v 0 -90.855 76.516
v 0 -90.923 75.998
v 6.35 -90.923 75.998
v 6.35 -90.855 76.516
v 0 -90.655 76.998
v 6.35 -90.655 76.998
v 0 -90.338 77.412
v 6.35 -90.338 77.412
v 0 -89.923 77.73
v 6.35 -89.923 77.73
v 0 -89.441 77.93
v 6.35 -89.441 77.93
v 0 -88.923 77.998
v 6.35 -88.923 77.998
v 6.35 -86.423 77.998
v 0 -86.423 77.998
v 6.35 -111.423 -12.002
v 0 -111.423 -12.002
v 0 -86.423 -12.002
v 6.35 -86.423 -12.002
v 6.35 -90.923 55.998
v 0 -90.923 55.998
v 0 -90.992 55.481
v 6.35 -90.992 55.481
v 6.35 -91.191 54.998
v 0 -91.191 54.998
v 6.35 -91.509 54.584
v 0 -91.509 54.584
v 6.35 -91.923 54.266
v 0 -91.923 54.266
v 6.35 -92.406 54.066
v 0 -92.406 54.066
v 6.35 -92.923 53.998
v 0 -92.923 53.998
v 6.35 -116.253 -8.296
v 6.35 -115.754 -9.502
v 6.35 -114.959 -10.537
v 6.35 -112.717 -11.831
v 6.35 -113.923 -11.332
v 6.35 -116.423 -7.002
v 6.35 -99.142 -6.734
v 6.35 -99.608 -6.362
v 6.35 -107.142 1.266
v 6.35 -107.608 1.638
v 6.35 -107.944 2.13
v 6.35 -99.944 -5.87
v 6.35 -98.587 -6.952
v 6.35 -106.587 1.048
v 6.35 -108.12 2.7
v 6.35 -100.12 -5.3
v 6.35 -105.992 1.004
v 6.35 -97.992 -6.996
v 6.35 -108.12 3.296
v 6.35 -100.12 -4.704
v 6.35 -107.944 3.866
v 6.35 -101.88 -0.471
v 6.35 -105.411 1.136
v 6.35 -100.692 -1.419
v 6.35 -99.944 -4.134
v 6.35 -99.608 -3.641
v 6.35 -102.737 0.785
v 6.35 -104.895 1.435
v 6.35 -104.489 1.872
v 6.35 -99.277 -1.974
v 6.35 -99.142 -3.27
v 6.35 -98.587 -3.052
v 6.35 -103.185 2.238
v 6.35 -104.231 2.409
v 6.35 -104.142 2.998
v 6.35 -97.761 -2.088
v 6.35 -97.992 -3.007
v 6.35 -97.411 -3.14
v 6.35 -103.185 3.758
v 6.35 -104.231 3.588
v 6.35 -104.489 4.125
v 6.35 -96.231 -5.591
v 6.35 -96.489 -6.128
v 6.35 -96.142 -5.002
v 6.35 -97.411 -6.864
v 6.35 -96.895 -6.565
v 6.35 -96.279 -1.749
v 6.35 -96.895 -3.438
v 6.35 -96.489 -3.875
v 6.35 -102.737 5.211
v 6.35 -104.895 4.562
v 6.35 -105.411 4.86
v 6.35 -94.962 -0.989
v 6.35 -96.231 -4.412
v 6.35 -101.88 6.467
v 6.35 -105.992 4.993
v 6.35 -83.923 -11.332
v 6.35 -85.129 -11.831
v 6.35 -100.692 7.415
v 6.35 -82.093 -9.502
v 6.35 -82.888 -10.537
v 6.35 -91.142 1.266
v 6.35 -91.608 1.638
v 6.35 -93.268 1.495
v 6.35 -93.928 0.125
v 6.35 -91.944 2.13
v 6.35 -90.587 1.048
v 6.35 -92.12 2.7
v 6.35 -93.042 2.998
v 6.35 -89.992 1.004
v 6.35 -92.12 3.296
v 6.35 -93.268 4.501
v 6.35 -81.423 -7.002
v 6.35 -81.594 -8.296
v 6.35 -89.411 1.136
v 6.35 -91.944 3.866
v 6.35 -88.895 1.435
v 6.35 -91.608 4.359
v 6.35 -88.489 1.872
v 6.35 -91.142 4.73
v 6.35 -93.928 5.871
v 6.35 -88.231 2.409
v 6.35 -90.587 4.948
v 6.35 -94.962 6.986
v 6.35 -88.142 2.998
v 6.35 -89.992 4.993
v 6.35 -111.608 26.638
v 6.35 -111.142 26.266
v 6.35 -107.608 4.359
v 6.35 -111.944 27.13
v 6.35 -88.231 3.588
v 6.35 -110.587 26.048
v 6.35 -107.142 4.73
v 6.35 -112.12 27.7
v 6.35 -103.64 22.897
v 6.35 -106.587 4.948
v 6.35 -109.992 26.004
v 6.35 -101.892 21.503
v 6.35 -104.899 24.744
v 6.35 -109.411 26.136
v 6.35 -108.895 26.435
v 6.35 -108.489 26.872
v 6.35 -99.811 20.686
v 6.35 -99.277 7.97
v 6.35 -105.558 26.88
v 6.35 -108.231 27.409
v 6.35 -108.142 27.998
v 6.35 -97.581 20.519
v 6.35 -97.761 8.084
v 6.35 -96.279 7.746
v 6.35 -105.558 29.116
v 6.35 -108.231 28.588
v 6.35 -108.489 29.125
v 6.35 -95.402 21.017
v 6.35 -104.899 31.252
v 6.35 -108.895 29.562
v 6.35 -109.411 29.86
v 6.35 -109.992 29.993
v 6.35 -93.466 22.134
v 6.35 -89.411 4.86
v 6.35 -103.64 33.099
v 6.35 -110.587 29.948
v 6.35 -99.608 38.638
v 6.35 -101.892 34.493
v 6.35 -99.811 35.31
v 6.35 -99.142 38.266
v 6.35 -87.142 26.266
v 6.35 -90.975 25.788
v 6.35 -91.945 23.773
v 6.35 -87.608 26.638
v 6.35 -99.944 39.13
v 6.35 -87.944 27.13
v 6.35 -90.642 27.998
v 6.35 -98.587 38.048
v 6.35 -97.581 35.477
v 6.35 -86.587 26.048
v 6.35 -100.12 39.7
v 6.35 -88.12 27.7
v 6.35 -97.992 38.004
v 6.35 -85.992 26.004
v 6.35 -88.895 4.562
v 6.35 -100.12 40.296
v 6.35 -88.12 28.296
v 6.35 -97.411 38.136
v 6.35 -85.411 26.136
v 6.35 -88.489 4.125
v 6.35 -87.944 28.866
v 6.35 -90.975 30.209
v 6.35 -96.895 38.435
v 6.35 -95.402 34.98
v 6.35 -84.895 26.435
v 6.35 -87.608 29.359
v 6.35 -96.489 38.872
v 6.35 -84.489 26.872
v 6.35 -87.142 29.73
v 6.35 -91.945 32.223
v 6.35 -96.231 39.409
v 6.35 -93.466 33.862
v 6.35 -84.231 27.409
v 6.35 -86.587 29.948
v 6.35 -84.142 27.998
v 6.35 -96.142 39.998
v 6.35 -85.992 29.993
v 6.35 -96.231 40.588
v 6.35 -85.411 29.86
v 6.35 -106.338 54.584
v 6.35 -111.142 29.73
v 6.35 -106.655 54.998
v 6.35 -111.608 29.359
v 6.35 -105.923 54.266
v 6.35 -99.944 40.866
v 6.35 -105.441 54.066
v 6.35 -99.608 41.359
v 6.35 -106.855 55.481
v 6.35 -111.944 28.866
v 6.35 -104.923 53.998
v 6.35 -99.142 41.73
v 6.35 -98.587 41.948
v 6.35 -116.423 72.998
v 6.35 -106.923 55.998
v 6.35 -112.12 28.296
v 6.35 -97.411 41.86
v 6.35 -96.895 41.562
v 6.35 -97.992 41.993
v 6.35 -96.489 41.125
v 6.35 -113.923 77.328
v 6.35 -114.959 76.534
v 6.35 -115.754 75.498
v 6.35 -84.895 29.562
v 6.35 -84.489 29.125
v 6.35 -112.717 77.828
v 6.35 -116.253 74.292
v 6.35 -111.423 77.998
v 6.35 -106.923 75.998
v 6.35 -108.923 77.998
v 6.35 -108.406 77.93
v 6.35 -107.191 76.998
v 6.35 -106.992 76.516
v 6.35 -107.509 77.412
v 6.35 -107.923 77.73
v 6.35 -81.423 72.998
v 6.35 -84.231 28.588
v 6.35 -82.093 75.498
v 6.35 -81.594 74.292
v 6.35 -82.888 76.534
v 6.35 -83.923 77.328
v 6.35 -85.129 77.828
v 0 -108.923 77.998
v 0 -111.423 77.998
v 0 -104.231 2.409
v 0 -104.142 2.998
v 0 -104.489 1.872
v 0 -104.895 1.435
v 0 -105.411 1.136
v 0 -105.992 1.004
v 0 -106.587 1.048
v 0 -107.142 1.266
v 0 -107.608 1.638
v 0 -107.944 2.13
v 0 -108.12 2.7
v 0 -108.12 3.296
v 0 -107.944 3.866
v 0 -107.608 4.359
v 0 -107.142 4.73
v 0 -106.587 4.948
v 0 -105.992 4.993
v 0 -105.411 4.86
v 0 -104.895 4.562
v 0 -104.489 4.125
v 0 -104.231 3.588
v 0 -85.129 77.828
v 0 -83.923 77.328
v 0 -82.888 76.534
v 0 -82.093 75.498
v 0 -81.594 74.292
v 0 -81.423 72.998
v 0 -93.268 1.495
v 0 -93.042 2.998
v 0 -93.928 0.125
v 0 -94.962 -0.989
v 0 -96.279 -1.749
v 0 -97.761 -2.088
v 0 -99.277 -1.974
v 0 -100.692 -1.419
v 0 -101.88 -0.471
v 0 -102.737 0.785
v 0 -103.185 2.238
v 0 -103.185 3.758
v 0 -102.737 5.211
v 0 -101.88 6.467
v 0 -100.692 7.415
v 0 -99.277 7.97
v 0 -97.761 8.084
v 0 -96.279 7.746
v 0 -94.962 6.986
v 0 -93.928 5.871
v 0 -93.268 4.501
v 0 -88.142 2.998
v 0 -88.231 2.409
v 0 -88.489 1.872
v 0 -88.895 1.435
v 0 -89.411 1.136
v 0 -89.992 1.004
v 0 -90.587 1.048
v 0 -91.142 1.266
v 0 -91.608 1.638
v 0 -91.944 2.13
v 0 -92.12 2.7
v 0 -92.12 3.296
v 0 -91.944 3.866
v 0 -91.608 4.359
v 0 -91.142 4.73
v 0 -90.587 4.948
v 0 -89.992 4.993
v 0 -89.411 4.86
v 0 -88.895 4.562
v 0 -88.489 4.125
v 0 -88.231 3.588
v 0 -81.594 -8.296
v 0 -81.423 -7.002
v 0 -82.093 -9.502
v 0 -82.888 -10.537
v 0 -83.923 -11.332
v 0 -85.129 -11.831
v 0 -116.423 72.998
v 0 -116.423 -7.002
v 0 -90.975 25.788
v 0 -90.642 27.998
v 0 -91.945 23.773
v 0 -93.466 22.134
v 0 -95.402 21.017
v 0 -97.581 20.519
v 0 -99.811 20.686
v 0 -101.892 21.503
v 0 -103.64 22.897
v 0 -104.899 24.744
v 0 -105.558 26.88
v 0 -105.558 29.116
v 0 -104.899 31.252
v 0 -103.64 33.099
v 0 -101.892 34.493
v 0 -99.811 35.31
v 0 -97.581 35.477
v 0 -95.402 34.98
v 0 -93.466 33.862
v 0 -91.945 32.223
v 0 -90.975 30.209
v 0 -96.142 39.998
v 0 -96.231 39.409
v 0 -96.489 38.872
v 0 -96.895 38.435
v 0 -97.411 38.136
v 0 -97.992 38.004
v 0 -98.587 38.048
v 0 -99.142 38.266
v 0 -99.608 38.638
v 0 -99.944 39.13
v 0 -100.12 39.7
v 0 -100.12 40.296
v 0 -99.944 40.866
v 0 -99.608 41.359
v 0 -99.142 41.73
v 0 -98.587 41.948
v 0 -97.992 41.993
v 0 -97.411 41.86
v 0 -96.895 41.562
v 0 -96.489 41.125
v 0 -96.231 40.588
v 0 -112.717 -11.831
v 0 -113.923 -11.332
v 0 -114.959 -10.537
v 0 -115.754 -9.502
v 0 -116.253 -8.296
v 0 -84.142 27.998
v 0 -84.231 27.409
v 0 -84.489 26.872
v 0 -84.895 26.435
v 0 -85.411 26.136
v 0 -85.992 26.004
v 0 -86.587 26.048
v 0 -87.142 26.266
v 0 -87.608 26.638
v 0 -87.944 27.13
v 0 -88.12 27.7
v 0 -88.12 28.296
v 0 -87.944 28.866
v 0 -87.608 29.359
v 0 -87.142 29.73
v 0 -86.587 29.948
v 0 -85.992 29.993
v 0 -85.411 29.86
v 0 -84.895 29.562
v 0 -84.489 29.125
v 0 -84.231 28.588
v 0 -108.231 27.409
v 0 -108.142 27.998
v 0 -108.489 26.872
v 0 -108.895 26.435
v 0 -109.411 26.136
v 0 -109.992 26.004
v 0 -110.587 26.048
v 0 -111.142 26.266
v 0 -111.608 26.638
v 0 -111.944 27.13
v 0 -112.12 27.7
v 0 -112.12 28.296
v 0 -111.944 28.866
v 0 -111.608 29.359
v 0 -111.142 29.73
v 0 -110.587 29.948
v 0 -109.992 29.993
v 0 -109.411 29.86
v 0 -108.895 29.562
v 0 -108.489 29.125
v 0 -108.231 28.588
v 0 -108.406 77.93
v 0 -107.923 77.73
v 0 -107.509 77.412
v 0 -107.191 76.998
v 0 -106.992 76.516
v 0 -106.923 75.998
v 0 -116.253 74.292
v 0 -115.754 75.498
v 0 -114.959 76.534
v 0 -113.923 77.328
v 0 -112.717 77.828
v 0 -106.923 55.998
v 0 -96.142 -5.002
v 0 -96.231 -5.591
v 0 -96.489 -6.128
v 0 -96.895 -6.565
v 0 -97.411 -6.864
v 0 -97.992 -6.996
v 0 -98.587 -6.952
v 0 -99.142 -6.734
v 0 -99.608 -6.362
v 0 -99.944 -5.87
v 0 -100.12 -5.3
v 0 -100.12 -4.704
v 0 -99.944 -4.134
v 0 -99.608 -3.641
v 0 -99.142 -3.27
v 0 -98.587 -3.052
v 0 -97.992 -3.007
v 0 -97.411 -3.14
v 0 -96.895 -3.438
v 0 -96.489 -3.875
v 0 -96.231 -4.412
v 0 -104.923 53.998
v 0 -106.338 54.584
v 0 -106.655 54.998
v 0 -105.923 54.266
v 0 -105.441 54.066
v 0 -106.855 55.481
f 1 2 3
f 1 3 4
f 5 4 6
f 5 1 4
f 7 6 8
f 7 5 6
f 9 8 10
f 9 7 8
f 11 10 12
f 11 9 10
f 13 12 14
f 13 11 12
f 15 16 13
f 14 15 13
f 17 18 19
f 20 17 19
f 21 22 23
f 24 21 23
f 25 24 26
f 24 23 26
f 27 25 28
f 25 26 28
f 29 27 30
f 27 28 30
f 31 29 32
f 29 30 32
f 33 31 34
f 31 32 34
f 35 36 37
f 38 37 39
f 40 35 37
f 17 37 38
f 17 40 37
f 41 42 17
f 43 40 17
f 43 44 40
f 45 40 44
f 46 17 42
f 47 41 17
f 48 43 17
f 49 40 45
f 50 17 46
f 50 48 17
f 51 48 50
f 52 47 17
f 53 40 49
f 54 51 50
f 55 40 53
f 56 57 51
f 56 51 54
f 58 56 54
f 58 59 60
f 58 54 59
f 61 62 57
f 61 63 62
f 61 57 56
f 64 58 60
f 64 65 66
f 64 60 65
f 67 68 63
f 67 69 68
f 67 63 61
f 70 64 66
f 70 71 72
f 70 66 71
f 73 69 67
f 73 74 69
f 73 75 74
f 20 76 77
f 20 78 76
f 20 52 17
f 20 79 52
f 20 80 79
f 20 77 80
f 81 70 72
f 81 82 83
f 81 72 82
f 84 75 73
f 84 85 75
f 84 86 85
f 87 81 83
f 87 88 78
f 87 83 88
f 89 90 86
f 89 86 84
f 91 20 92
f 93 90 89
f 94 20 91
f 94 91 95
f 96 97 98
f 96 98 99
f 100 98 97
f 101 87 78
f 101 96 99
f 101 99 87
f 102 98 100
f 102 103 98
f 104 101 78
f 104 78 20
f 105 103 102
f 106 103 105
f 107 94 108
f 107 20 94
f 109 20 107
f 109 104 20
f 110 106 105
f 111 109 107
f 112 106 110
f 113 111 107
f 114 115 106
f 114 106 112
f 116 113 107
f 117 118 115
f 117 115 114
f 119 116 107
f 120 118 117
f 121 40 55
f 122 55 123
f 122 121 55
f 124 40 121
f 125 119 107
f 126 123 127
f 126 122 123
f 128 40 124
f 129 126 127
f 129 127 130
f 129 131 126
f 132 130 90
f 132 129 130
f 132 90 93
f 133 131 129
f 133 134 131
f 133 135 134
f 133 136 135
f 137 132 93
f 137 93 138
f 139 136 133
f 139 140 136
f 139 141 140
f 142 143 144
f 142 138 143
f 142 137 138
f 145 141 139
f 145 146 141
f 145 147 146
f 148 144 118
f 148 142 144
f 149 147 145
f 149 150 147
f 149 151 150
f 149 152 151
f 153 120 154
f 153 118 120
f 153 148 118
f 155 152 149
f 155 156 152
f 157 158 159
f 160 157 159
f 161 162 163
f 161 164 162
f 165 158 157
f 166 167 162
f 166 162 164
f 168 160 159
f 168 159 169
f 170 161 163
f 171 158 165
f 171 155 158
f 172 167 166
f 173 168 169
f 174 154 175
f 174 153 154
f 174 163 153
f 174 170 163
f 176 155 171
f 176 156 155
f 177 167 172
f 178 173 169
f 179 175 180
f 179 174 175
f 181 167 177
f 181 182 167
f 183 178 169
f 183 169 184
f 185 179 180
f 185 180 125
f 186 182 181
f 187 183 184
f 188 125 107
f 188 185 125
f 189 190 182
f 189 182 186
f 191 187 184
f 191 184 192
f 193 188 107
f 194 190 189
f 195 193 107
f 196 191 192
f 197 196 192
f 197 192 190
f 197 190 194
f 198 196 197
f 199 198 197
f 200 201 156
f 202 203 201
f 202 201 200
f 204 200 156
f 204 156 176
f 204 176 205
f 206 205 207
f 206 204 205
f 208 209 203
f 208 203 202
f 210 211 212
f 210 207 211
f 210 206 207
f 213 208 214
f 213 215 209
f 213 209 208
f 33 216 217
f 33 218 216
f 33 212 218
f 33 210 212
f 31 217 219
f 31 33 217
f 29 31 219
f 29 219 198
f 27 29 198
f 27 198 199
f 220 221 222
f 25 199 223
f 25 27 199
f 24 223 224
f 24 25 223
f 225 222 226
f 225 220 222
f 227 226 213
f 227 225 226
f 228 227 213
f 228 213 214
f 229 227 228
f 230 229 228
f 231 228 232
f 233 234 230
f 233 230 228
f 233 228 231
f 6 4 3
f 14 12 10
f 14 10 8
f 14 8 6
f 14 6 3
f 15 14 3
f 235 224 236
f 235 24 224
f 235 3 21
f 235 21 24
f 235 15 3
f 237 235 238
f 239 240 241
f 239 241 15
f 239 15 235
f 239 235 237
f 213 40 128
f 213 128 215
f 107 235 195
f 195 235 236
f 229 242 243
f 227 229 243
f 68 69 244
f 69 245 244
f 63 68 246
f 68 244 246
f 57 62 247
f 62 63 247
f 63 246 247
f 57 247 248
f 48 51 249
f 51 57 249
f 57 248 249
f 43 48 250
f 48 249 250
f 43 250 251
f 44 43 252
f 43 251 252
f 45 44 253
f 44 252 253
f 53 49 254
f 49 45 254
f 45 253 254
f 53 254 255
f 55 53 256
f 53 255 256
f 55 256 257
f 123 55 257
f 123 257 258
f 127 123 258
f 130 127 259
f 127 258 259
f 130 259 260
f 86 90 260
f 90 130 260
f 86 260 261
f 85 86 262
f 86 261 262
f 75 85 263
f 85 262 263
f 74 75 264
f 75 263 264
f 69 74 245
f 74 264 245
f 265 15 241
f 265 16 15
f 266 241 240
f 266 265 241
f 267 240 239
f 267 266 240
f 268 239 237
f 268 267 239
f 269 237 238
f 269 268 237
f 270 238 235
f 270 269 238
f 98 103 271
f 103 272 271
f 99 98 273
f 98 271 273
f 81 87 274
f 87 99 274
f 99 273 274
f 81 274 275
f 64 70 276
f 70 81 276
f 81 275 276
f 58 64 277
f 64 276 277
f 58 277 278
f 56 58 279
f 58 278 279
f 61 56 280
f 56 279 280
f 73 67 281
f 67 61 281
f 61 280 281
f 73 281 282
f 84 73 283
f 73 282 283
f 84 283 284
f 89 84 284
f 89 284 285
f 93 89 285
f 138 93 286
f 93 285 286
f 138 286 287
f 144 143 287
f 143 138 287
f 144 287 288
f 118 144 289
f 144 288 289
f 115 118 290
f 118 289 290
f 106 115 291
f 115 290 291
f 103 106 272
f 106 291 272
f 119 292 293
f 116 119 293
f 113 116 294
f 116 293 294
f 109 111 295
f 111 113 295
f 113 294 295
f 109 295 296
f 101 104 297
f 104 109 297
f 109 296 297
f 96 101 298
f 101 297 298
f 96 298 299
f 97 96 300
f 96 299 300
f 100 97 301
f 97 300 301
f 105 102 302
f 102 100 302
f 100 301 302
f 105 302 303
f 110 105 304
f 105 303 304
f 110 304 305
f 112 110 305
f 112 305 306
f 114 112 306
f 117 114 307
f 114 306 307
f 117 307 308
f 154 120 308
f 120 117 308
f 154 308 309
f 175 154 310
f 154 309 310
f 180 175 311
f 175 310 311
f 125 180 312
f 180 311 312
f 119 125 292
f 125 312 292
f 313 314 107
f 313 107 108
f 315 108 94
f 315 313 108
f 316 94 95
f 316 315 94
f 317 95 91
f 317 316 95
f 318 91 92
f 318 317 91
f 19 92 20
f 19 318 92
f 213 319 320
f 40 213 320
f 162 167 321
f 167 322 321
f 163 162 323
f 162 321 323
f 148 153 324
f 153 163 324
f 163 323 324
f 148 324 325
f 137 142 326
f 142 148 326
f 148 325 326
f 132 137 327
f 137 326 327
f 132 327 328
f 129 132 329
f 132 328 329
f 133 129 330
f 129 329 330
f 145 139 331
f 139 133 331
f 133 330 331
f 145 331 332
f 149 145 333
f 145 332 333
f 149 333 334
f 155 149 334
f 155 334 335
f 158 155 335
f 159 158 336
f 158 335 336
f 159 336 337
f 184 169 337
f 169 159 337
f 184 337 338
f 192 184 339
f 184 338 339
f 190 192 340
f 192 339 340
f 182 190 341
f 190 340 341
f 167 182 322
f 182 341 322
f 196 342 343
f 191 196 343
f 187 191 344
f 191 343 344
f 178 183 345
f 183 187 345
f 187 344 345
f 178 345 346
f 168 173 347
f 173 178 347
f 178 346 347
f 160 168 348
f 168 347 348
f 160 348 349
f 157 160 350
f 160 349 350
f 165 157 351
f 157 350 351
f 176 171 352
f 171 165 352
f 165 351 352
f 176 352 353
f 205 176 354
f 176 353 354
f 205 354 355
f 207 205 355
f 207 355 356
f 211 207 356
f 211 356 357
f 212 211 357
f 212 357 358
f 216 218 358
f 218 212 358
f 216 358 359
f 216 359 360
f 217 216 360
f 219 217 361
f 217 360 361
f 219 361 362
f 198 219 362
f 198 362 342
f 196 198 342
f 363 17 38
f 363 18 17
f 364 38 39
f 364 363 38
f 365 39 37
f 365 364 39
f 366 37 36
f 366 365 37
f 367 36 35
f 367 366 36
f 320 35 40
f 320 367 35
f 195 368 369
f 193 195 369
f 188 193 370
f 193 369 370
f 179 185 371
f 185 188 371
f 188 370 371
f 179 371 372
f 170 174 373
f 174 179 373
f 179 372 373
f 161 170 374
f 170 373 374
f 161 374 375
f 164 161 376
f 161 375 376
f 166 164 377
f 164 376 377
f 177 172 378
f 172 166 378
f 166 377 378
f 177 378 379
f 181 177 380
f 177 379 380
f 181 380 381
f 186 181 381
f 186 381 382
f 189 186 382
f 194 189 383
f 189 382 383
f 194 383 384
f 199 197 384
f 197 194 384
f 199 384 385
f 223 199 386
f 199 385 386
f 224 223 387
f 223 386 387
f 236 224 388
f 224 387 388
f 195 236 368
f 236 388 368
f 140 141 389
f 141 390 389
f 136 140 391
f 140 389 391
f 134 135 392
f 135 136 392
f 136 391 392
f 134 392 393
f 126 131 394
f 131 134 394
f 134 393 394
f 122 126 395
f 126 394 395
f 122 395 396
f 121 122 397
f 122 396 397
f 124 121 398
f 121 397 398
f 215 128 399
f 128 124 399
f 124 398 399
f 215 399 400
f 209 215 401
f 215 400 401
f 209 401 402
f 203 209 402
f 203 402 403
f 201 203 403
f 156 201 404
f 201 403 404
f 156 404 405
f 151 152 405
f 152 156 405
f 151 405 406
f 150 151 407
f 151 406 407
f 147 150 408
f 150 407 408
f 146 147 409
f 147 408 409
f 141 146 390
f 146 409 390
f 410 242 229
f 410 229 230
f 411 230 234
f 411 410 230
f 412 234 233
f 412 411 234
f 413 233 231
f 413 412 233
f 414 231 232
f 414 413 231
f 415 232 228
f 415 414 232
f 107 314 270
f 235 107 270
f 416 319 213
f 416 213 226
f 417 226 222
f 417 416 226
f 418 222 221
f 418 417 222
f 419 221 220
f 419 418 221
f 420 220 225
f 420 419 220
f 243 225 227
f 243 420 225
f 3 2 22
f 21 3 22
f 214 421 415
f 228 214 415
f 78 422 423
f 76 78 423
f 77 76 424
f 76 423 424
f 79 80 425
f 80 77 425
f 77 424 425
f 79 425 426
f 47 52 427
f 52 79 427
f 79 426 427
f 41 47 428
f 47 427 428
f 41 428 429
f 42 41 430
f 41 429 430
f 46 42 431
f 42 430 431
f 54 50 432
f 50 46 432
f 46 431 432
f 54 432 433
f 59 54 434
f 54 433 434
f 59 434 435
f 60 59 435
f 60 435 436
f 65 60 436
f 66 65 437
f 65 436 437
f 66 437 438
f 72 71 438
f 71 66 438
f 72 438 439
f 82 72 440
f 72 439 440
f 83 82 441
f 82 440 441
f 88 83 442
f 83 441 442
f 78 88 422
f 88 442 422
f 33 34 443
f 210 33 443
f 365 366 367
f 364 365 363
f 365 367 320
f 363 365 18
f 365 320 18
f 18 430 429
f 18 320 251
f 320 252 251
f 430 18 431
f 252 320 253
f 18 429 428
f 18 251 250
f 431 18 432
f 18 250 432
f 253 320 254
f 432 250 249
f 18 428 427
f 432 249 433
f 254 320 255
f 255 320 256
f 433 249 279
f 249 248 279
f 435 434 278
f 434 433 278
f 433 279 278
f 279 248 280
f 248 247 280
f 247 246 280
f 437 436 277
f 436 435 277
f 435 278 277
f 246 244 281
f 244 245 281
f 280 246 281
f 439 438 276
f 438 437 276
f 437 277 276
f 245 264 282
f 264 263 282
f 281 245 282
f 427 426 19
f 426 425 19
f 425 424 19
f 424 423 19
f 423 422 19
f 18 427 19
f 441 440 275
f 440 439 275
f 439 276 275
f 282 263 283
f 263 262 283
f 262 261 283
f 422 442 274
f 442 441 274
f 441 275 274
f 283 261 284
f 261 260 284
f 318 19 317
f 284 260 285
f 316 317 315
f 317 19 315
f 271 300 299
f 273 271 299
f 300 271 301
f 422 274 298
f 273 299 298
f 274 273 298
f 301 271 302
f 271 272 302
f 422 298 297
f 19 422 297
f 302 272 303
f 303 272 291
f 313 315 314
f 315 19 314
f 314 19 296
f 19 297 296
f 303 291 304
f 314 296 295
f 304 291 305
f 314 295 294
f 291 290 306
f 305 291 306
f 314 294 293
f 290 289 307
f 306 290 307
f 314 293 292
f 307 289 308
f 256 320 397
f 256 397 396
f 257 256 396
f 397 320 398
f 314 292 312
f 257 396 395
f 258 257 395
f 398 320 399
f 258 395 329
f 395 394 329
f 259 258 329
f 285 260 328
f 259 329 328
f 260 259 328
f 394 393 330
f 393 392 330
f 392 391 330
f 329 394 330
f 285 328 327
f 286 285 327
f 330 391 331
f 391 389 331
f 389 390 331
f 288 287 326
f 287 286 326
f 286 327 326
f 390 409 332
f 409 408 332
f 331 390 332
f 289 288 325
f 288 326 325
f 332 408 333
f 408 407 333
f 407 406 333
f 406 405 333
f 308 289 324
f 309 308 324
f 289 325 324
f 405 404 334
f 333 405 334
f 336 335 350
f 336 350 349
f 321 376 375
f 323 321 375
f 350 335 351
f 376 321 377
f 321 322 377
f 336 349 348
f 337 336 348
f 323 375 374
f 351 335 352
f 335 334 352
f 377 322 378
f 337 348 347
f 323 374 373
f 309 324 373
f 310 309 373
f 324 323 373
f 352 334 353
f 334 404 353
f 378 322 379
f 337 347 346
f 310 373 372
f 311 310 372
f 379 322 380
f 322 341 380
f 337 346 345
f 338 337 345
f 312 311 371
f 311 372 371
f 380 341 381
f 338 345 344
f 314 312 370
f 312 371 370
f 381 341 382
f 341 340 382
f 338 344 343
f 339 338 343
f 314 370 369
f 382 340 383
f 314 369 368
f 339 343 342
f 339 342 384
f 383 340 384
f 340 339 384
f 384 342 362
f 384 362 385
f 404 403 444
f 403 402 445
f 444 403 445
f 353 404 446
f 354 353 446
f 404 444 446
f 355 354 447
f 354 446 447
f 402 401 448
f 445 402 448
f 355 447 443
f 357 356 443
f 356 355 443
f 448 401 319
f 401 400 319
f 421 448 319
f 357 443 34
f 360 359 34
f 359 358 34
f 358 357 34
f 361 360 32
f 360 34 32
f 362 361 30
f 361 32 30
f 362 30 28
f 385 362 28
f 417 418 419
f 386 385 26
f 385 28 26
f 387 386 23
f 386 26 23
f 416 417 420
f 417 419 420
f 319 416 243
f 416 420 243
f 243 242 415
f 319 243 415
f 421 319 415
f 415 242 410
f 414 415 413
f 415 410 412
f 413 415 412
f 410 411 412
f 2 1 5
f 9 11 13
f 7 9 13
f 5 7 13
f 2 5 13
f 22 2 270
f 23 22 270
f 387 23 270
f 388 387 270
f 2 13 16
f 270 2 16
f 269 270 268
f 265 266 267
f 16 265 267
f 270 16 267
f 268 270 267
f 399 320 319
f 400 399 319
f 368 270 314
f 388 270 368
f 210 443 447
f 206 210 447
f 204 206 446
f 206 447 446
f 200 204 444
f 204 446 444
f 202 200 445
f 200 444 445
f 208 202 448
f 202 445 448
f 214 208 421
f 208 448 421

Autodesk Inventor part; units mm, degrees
ref_plane "YZ Plane" through (0, 0, 0) normal (1, 0, 0) x (0, 1, 0)
ref_plane "XZ Plane" through (0, 0, 0) normal (0, 1, 0) x (-1, 0, 0)
ref_plane "XY Plane" through (0, 0, 0) normal (0, 0, 1) x (1, 0, 0)
sketch "Sketch1" plane through (0, 0, 0) normal (1, 0, 0) x (0, 1, 0)
  line L0 (-116.4234, 72.9982) -> (-116.4234, -7.0018)
  line L1 (-111.4234, -12.0018) -> (-86.4234, -12.0018)
  line L2 (-81.4234, -7.0018) -> (-81.4234, 72.9982)
  line L3 (-90.9234, 75.9982) -> (-90.9234, 55.9982)
  line L4 (-92.9234, 53.9982) -> (-104.9234, 53.9982)
  line L5 (-106.9234, 55.9982) -> (-106.9234, 75.9982)
  line L6 (-86.4234, 77.9982) -> (-88.9234, 77.9982)
  line L7 (-108.9234, 77.9982) -> (-111.4234, 77.9982)
  circle A0 centre (-98.1419, 27.9982) radius 7.5
  circle A1 centre (-98.1419, 2.9982) radius 5.1
  circle A2 centre (-110.1419, 27.9982) radius 2
  circle A3 centre (-112.4234, 61.8916) radius 2
  circle A4 centre (-56.4234, 61.8916) radius 2
  circle A5 centre (-106.1419, 2.9982) radius 2
  circle A6 centre (-98.1419, 15.9982) radius 2
  circle A7 centre (-86.1419, 27.9982) radius 2
  circle A8 centre (-98.1419, 39.9982) radius 2
  circle A9 centre (-98.1419, -5.0018) radius 2
  circle A10 centre (-90.1419, 2.9982) radius 2
  circle A11 centre (-98.1419, 10.9982) radius 2
  arc A12 (-111.4234, 77.9982) -> (-116.4234, 72.9982) centre (-111.4234, 72.9982) ccw
  arc A13 (-81.4234, 72.9982) -> (-86.4234, 77.9982) centre (-86.4234, 72.9982) ccw
  arc A14 (-116.4234, -7.0018) -> (-111.4234, -12.0018) centre (-111.4234, -7.0018) ccw
  arc A15 (-86.4234, -12.0018) -> (-81.4234, -7.0018) centre (-86.4234, -7.0018) ccw
  arc A16 (-106.9234, 55.9982) -> (-104.9234, 53.9982) centre (-104.9234, 55.9982) ccw
  arc A17 (-92.9234, 53.9982) -> (-90.9234, 55.9982) centre (-92.9234, 55.9982) ccw
  arc A18 (-106.9234, 75.9982) -> (-108.9234, 77.9982) centre (-108.9234, 75.9982) ccw
  arc A19 (-88.9234, 77.9982) -> (-90.9234, 75.9982) centre (-88.9234, 75.9982) ccw
  point P0 (-81.4234, 77.9982)
  point P1 (-116.4234, -12.0018)
  point P2 (-116.4234, 77.9982)
  point P3 (-81.4234, -12.0018)
  point P4 (-90.9234, 77.9982)
  point P5 (-90.9234, 53.9982)
  point P6 (-106.9234, 53.9982)
  point P7 (-106.9234, 77.9982)
  dimension "d29" = 360
  dimension "d44" = 35
  dimension "d45" = 90
  dimension "d46" = 16
  dimension "d47" = 24
  dimension "d48" = 15
  dimension "d53" = 10.2
  dimension "d54" = 25
  dimension "d55" = 26
  dimension "d58" = 56
  dimension "d59" = 4
  dimension "d60" = 4
  dimension "d62" = 12
  dimension "d63" = 8
  dimension "d66" = 360
  dimension "d70" = 360
  dimension "d72" = 5
  dimension "d73" = 2
extrude "Extrusion1" add sketch "Sketch1" along normal blind 6.35 contours A12 L7 A18 L5 A16 L4 A17 L3 A19 L6 A13 L2 A15 L1 A14 L0 | A3 | A6 | A11
properties part number "carriage"
